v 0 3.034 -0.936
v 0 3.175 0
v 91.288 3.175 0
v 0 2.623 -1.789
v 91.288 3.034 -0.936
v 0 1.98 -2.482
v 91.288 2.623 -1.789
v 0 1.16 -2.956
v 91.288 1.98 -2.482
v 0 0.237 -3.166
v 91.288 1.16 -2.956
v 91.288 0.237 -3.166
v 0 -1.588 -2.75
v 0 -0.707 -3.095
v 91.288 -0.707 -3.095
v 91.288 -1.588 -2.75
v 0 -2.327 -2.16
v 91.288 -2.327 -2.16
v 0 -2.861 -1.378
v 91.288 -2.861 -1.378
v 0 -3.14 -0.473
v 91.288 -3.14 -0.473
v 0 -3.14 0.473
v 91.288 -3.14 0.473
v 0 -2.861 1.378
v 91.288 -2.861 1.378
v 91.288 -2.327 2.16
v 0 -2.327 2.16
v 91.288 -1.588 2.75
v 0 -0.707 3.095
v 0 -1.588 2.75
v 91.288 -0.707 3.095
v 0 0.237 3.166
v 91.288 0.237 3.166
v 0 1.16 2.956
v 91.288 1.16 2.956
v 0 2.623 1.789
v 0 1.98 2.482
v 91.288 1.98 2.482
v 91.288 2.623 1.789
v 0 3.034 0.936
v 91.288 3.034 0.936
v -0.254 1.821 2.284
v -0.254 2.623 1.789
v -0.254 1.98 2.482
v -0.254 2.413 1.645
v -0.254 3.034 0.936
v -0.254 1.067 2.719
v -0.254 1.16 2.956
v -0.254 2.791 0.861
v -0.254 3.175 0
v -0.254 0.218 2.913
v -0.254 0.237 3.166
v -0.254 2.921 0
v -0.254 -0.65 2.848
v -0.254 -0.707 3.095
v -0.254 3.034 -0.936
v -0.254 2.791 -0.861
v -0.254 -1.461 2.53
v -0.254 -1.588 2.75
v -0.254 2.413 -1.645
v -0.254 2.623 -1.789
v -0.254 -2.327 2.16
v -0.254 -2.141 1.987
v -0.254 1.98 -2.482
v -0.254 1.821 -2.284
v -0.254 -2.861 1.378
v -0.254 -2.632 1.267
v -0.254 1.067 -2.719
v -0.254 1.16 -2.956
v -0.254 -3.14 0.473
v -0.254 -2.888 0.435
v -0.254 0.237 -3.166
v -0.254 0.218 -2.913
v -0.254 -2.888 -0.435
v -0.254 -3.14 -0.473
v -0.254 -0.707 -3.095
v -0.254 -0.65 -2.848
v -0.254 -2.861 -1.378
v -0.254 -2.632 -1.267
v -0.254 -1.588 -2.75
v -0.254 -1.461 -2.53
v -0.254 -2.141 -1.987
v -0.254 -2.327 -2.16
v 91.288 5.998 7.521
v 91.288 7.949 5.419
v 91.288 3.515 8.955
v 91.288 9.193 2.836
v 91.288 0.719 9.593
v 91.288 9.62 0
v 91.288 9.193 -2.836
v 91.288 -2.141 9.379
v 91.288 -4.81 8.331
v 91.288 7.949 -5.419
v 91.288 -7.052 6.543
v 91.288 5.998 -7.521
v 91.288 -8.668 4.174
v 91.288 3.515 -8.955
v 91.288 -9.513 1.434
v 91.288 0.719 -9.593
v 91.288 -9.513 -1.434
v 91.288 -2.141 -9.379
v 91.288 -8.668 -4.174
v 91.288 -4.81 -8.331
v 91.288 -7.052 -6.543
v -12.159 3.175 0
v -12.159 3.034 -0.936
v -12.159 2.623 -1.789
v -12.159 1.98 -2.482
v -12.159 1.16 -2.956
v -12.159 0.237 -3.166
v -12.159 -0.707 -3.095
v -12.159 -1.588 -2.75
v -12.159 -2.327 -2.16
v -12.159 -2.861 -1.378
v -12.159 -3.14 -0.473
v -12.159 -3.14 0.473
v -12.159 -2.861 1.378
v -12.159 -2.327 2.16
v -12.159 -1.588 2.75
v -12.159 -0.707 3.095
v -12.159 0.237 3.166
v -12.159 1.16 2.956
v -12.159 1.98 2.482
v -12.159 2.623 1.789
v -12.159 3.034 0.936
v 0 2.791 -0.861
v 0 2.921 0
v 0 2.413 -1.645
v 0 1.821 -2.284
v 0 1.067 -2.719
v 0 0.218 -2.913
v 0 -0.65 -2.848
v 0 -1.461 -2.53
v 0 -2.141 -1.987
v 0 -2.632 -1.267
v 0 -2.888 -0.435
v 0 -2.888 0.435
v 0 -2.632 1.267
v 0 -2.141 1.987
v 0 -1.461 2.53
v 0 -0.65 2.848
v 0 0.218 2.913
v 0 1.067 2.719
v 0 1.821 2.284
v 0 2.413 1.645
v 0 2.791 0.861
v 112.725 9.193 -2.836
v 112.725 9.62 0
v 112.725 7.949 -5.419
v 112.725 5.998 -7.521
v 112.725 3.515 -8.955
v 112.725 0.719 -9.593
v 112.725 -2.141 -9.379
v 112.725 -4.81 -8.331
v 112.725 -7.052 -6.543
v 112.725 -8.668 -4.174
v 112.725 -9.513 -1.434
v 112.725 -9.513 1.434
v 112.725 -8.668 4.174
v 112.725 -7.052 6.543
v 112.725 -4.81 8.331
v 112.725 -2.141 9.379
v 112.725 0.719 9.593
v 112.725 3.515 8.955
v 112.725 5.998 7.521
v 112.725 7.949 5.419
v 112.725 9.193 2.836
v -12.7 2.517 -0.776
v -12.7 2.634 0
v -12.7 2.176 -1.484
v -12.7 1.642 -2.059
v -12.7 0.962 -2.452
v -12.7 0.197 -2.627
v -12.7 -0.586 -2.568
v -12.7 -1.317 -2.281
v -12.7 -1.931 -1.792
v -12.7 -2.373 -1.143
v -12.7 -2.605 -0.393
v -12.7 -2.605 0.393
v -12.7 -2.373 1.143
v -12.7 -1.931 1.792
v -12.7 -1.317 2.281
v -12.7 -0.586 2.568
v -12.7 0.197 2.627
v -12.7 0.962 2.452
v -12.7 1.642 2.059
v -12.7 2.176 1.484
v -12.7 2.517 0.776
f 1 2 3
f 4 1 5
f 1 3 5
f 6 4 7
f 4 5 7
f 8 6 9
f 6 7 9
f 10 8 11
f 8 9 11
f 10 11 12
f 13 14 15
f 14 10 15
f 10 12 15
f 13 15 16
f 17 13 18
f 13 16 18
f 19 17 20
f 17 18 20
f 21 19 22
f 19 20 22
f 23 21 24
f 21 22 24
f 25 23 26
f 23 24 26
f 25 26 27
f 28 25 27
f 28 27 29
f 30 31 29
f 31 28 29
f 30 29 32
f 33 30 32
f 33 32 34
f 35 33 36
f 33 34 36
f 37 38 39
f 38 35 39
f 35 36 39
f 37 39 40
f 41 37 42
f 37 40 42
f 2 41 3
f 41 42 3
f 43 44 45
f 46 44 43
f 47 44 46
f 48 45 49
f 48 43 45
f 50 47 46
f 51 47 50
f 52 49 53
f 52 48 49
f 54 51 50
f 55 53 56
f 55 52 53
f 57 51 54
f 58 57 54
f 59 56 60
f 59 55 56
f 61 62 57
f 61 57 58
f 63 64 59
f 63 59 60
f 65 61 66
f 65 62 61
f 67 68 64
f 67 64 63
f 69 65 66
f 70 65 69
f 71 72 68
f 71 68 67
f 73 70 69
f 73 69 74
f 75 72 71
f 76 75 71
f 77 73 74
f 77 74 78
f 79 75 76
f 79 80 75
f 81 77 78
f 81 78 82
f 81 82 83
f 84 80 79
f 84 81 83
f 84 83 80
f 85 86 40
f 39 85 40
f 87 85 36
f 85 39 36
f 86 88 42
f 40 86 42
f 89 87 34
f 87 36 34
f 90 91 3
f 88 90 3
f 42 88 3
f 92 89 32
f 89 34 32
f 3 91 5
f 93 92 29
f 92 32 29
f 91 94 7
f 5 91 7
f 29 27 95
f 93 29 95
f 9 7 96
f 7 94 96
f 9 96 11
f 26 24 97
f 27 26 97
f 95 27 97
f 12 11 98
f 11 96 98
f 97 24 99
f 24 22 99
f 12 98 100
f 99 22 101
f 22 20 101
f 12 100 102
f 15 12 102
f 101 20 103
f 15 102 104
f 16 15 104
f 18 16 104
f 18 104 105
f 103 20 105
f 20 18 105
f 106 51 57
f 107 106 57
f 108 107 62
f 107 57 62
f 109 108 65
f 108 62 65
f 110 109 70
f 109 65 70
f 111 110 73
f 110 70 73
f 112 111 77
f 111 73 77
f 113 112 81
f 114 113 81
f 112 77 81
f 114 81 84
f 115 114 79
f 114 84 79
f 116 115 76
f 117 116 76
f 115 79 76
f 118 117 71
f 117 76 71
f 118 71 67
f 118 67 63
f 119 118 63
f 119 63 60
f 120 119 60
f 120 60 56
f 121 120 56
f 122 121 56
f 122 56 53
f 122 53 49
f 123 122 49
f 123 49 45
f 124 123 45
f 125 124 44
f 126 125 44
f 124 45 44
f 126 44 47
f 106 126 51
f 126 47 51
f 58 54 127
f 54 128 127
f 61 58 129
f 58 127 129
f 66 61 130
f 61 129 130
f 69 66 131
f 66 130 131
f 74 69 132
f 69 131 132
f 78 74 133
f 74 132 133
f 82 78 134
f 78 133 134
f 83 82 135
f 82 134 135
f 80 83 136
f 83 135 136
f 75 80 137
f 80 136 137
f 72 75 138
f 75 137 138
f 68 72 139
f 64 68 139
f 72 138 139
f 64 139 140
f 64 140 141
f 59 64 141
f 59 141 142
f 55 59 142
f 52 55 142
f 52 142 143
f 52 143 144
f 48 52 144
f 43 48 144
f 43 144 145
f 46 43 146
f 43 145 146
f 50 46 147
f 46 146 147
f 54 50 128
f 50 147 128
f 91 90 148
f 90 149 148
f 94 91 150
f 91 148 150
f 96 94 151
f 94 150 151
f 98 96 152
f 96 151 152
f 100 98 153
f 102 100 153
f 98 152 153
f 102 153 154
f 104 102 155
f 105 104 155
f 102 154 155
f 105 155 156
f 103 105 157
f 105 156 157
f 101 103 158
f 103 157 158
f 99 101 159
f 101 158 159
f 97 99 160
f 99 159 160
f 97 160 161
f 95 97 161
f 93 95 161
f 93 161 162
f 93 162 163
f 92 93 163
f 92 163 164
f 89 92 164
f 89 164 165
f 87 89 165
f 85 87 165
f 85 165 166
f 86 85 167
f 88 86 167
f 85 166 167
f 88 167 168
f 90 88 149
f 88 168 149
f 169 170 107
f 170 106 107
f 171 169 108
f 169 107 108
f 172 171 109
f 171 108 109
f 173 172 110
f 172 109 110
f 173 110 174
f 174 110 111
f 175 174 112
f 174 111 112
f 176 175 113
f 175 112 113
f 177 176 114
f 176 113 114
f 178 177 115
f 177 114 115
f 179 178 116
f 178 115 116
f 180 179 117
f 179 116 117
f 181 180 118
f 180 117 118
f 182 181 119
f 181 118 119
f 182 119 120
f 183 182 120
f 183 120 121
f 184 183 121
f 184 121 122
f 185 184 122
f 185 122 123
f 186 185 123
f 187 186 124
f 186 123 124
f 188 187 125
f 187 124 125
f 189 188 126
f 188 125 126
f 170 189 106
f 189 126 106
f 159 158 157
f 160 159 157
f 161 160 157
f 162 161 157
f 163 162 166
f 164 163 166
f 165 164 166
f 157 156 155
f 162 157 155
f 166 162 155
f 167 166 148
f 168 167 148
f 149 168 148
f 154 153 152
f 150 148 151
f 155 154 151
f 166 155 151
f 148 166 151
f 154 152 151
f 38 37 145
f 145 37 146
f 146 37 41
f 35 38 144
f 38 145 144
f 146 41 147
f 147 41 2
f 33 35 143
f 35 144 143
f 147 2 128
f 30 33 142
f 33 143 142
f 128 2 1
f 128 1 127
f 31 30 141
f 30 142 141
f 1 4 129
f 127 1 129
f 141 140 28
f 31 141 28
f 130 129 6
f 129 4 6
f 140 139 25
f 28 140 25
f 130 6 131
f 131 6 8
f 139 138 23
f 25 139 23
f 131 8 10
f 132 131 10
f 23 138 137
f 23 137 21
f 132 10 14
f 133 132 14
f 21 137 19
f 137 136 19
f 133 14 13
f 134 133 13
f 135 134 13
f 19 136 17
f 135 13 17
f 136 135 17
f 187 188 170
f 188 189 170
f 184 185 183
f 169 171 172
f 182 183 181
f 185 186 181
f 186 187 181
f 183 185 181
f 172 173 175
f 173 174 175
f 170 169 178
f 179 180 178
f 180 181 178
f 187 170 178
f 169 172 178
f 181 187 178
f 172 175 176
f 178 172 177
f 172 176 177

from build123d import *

# Parameters (mm, degrees)
SKETCH3_W = 0.254
SKETCH3_H = 0.508


with BuildPart() as part:
    # Sketch1 → Revolve1 (revolve)
    with BuildSketch(Plane.XY):
        Polygon((0, 0), (0, 3.175), (91.2876, 3.175), (91.2876, 9.62025), (112.7252, 9.62025), (112.7252, 0), align=None)
    revolve(axis=Axis((112.7252, 0, 0), (-1, 0, 0)))

    # Sketch2 → Revolve2 (revolve)
    with BuildSketch(Plane.XY):
        Polygon((-12.7, 0), (-12.7, 2.63398), (-12.15898, 3.175), (0, 3.175), (0, 0), align=None)
    revolve(axis=Axis((0, 0, 0), (-1, 0, 0)))

    # Sketch3 → Cut-Revolve1 (revolve, cut)
    with BuildSketch(Plane.XY):
        with Locations((-0.127, 3.175)):
            Rectangle(SKETCH3_W, SKETCH3_H)
    revolve(axis=Axis((0, 0, 0), (-1, 0, 0)), mode=Mode.SUBTRACT)


solid = part.part
